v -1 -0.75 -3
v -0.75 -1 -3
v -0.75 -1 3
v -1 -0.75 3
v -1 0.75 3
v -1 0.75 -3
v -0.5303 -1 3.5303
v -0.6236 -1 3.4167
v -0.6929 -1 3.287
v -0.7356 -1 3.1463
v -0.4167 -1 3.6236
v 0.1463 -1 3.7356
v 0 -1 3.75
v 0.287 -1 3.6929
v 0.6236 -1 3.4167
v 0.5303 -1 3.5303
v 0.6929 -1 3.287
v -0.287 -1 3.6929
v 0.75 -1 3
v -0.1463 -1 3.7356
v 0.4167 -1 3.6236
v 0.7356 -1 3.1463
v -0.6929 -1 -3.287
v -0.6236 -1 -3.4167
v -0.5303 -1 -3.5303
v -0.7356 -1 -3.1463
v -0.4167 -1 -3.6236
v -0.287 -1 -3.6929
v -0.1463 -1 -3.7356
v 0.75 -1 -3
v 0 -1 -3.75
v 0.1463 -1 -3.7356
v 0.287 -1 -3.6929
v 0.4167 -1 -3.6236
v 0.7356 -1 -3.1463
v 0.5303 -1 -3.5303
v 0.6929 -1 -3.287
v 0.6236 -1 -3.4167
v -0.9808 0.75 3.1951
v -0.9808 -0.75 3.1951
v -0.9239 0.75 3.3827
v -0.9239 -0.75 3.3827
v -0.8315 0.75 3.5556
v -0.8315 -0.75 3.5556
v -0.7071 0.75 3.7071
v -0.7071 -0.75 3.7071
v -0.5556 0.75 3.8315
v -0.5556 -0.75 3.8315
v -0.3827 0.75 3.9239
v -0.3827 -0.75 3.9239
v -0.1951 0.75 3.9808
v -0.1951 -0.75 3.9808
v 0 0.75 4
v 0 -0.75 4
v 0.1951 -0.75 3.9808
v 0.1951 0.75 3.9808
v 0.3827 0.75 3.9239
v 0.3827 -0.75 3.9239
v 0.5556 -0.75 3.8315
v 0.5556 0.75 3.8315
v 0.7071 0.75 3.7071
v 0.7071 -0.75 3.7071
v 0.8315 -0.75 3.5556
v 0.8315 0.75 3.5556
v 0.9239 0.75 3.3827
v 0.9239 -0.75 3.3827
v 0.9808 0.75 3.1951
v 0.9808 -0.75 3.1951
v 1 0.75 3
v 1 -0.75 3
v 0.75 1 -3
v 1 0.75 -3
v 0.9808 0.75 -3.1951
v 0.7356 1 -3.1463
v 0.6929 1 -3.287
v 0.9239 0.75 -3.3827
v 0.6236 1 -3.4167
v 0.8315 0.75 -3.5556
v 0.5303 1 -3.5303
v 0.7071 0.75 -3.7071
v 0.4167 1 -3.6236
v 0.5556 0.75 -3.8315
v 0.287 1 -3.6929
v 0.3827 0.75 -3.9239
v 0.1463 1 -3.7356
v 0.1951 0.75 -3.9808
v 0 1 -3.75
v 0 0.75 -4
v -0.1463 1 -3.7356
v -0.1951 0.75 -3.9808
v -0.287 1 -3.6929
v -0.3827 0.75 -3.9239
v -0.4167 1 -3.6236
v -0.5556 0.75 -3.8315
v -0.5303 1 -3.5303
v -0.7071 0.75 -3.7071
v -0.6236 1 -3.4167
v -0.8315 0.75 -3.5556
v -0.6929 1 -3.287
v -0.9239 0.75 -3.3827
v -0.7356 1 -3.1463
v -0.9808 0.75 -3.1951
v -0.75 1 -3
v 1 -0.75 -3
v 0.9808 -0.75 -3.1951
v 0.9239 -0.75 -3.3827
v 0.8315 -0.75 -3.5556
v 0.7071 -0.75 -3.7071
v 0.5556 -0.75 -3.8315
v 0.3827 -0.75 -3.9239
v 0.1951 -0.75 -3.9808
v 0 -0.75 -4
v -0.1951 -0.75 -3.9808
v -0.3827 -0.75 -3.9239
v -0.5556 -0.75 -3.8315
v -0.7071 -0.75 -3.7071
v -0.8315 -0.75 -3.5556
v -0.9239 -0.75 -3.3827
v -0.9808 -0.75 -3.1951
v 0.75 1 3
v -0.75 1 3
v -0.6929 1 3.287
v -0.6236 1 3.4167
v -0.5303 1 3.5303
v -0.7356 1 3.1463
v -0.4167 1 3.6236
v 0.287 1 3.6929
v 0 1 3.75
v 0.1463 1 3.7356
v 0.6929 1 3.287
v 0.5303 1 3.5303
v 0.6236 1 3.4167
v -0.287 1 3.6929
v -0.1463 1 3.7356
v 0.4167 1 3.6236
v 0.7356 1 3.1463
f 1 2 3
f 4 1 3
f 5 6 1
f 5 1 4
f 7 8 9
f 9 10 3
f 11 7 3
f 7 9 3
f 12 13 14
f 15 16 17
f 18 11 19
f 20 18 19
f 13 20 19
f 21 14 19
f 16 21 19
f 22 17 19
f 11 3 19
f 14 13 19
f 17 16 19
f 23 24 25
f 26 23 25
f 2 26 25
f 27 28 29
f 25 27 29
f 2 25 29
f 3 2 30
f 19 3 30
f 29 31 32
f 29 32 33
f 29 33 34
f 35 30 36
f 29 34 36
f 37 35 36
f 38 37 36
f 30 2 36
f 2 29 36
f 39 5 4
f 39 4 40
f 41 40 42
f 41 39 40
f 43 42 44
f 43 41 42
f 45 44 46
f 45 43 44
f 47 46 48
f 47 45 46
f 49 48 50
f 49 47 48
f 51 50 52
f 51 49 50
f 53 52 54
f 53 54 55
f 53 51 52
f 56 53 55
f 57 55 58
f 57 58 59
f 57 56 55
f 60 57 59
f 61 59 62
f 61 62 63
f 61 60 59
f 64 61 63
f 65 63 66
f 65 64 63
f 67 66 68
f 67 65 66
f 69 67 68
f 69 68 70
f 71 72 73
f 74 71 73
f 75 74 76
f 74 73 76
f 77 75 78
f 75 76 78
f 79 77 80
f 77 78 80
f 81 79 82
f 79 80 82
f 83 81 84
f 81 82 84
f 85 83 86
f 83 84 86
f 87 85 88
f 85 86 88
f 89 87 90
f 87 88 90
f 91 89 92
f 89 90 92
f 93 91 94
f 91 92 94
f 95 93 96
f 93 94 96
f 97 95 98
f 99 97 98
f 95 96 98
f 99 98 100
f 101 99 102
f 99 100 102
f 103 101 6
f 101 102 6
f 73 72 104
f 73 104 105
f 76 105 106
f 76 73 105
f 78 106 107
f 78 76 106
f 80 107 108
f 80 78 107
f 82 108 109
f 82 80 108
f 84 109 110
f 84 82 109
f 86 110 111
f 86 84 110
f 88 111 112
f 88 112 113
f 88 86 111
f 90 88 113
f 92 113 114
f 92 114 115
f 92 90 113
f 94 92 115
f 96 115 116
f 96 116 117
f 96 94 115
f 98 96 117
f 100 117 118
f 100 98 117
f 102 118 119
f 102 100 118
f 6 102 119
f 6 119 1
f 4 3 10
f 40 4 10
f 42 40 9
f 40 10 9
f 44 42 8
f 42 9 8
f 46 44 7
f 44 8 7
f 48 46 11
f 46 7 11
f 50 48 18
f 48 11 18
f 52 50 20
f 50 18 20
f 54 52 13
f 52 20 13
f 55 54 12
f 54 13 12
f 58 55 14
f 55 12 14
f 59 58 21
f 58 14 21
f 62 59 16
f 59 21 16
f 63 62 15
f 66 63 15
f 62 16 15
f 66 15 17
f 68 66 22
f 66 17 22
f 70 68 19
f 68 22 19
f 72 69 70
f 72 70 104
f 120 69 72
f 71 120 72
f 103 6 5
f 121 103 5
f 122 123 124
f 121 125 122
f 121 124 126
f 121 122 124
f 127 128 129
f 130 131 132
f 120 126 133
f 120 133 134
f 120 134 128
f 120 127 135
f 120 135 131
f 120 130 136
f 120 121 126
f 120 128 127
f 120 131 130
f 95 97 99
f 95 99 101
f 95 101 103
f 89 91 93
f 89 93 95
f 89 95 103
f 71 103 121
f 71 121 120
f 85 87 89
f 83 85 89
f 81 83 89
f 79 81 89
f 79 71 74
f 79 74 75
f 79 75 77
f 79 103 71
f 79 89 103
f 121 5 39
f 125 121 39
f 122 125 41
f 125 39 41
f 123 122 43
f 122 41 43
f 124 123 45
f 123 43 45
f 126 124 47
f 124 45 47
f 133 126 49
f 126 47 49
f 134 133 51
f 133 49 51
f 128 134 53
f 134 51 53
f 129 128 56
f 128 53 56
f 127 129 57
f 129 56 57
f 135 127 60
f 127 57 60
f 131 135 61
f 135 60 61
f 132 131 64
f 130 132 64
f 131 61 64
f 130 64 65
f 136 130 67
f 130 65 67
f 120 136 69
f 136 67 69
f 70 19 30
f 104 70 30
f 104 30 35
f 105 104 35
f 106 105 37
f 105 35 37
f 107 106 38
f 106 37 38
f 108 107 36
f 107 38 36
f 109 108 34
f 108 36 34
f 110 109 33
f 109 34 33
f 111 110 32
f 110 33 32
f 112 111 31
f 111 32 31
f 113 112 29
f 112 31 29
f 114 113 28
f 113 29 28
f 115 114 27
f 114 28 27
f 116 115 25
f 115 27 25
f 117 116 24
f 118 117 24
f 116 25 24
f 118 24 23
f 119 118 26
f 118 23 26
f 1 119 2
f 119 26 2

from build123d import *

# Parameters (mm, degrees)
VYSUNOUT1_DEPTH = 1
ZKOSIT1_SIZE    = 0.25


with BuildPart() as part:
    # Skica1 → Vysunout1 (new, symmetric)
    with BuildSketch(Plane(origin=(0, 0, 0), x_dir=(1, 0, 0), z_dir=(0, 1, 0))):
        with BuildLine():
            Line((-1, 3), (-1, -3))
            ThreePointArc((-1, -3), (0, -4), (1, -3))
            Line((1, -3), (1, 3))
            ThreePointArc((1, 3), (0, 4), (-1, 3))
        make_face()
    extrude(amount=VYSUNOUT1_DEPTH, both=True)

    # Zkosit1
    zkosit1_edges = [part.edges().sort_by_distance(p)[0] for p in [
        (0, 1, 4),
        (1, 1, 0),
        (0, 1, -4),
        (1, -1, 0),
        (0, -1, 4),
        (-1, -1, 0),
        (0, -1, -4),
        (-1, 1, 0),
    ]]
    chamfer(zkosit1_edges, length=ZKOSIT1_SIZE)


solid = part.part
